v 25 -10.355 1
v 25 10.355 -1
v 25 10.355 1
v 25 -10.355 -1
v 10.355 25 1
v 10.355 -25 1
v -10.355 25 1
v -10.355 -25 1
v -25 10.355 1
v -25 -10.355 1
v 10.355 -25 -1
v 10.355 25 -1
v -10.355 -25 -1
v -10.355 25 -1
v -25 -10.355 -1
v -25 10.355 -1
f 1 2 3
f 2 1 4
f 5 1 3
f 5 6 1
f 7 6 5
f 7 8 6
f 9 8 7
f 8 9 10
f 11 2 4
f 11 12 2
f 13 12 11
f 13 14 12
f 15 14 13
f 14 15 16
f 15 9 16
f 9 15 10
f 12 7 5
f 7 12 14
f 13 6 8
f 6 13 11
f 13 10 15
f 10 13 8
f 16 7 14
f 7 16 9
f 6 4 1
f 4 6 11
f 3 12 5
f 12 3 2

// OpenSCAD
intersection() {
  cube([50,50,2], center=true);
  rotate([0,0,45])
    cube([50,50,2], center=true);
}
